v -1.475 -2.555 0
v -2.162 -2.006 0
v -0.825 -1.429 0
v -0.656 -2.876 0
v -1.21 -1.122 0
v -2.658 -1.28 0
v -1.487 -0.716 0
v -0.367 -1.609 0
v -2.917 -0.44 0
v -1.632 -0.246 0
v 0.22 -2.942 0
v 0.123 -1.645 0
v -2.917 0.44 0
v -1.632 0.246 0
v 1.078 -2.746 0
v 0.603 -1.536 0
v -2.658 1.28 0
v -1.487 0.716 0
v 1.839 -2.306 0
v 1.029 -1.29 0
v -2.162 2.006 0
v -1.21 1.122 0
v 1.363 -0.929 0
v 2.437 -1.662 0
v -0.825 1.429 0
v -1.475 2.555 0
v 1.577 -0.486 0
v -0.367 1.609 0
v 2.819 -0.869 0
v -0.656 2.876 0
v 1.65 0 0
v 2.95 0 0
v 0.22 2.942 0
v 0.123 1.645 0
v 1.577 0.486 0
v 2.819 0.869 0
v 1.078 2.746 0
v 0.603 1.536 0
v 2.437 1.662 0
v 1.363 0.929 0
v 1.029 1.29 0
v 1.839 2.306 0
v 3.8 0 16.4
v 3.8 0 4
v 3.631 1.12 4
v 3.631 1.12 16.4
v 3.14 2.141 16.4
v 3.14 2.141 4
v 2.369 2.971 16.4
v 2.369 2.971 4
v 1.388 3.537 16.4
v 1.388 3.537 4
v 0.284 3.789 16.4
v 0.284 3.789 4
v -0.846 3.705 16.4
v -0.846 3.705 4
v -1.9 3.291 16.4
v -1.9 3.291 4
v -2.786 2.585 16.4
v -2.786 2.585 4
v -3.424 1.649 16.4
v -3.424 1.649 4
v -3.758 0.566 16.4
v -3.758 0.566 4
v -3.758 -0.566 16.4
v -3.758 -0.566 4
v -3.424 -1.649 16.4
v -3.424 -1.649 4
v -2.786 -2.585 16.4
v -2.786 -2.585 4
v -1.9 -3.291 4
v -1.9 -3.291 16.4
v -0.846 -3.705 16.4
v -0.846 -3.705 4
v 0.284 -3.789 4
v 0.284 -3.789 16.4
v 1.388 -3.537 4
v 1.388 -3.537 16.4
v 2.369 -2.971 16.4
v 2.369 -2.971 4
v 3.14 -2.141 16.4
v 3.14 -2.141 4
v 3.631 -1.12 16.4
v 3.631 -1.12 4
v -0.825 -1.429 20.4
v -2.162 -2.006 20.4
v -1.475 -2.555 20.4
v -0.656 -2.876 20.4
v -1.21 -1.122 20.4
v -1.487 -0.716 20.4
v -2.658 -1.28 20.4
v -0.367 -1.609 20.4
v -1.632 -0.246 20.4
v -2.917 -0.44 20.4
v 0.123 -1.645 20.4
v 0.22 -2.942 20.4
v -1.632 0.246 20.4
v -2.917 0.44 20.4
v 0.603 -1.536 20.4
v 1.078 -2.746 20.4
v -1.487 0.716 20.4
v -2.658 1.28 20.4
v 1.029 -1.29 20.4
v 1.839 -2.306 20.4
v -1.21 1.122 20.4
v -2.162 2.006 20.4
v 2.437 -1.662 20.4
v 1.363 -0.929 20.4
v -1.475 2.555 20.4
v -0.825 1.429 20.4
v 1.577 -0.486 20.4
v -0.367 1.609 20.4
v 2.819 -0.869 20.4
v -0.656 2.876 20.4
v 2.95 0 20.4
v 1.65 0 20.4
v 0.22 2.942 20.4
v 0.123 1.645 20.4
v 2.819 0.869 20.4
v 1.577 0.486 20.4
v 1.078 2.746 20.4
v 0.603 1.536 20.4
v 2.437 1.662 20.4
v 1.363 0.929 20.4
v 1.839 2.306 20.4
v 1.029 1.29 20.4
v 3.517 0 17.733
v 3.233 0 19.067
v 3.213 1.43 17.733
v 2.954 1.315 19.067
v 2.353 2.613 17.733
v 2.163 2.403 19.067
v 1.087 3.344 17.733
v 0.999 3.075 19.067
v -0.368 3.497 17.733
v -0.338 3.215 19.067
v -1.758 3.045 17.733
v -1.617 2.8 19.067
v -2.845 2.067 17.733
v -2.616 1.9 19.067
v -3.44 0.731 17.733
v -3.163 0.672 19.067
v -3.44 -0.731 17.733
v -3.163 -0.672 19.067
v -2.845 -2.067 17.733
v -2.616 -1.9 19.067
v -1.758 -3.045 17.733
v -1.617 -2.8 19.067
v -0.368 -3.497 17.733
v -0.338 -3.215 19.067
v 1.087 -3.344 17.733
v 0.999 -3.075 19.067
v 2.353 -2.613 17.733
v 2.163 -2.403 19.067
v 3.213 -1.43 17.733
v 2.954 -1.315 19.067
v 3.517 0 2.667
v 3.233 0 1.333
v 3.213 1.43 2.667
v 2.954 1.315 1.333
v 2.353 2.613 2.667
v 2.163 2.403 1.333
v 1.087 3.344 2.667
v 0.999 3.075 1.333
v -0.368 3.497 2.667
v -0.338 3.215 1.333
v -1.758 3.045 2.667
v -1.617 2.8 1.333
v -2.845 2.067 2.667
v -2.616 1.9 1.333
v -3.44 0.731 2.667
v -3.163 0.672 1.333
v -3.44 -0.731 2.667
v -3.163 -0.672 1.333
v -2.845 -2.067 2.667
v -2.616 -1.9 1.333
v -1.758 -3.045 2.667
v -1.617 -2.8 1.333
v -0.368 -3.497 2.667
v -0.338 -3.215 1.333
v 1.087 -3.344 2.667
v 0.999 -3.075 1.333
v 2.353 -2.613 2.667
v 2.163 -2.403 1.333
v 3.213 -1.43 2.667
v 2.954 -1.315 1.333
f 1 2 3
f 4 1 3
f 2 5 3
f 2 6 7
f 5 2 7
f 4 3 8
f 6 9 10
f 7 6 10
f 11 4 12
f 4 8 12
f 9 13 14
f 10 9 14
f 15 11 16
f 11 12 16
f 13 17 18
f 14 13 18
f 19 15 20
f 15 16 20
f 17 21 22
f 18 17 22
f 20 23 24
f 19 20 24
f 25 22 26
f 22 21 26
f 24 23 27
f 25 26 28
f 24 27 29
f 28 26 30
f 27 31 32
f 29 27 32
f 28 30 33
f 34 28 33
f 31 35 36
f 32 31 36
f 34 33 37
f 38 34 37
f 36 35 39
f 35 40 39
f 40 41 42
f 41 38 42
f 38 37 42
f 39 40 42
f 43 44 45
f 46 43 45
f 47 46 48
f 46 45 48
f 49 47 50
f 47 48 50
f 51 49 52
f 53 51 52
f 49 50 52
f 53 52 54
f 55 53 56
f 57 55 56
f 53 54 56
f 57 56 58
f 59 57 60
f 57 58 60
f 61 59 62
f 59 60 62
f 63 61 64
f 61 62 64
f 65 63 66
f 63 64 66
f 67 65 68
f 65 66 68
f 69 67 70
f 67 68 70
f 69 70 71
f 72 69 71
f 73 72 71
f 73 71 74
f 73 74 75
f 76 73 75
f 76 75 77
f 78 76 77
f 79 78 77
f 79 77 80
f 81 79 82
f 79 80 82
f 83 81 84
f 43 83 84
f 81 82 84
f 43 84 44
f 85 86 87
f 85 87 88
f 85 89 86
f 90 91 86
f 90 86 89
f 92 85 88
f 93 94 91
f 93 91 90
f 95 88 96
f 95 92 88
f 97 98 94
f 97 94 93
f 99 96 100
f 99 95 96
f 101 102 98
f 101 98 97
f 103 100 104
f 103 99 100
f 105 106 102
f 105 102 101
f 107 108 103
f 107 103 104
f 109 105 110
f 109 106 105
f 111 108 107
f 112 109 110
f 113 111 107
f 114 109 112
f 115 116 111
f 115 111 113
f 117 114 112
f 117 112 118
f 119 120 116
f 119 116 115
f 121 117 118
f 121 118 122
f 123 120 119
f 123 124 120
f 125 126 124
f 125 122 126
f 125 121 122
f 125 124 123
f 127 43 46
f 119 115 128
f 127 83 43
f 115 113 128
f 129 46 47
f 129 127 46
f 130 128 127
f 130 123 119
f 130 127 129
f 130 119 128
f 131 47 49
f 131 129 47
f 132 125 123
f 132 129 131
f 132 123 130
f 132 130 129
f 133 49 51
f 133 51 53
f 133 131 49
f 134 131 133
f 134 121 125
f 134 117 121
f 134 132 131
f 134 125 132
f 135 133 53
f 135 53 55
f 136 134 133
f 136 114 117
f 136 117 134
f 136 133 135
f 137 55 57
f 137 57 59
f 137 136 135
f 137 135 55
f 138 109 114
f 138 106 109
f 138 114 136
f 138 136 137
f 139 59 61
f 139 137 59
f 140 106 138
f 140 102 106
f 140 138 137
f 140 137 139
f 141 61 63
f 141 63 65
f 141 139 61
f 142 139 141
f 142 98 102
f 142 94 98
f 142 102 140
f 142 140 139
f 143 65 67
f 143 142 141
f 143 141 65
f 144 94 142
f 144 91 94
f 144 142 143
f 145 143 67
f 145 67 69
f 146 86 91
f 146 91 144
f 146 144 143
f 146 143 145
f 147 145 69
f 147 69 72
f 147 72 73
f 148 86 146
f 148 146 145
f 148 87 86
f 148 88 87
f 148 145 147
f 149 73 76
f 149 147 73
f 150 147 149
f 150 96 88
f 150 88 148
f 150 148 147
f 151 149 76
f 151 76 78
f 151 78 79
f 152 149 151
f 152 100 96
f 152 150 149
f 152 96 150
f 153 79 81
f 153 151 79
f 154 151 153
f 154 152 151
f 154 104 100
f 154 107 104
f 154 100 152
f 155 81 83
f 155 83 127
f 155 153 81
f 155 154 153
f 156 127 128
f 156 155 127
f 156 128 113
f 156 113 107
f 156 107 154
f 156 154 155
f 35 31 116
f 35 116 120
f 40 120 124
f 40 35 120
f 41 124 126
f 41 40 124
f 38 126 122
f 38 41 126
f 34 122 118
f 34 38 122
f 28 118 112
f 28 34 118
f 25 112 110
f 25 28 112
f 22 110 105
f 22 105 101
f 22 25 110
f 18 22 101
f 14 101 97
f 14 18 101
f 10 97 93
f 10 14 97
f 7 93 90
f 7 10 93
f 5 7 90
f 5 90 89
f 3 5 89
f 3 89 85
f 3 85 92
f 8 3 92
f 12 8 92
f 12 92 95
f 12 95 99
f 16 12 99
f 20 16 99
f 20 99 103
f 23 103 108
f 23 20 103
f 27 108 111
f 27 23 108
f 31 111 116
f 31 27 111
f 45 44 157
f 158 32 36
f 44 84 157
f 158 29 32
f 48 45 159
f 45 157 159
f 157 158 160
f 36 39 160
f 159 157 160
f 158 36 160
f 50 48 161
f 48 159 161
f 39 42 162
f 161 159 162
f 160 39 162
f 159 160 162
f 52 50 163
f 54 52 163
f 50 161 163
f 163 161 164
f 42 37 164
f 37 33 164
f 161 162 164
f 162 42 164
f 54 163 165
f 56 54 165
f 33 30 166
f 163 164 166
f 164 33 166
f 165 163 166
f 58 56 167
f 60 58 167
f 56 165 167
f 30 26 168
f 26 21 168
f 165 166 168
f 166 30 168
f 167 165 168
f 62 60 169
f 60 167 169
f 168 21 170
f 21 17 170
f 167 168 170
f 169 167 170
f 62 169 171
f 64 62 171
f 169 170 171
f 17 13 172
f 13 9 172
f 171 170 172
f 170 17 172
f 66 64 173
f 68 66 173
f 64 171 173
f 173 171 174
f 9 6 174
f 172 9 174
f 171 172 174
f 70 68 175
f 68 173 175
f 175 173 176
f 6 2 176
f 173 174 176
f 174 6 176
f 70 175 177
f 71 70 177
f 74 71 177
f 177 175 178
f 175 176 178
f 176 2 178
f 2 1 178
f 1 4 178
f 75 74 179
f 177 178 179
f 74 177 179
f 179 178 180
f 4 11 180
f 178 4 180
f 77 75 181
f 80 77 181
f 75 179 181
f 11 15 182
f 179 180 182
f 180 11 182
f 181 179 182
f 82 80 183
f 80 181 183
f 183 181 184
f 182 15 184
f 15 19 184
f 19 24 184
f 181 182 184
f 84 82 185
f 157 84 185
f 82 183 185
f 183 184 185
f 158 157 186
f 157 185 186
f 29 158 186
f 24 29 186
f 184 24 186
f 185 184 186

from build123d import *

# Parameters (mm, degrees)
SKETCH1_R           = 3.8
SKETCH1_R_2         = 1.65
BOSS_EXTRUDE1_DEPTH = 20.4
CHAMFER1_SIZE       = 4
CHAMFER1_SIZE2      = 0.850226247
CHAMFER2_SIZE       = 4
CHAMFER2_SIZE2      = 0.850226247


with BuildPart() as part:
    # Sketch1 → Boss-Extrude1 (new body)
    with BuildSketch(Plane.XY):
        Circle(SKETCH1_R)
        Circle(SKETCH1_R_2, mode=Mode.SUBTRACT)
    extrude(amount=BOSS_EXTRUDE1_DEPTH)

    # Chamfer1
    chamfer1_edges = [part.edges().sort_by_distance(p)[0] for p in [
        (-3.8, 0, 20.4),
    ]]
    chamfer1_side = [part.faces().sort_by_distance(p)[0] for p in [
        (-3.8, 0, 10.2),
    ]]
    chamfer(chamfer1_edges, length=CHAMFER1_SIZE, length2=CHAMFER1_SIZE2, reference=chamfer1_side[0])

    # Chamfer2
    chamfer2_edges = [part.edges().sort_by_distance(p)[0] for p in [
        (-3.8, 0, 0),
    ]]
    chamfer2_side = [part.faces().sort_by_distance(p)[0] for p in [
        (-3.8, 0, 8.2),
    ]]
    chamfer(chamfer2_edges, length=CHAMFER2_SIZE, length2=CHAMFER2_SIZE2, reference=chamfer2_side[0])


solid = part.part
